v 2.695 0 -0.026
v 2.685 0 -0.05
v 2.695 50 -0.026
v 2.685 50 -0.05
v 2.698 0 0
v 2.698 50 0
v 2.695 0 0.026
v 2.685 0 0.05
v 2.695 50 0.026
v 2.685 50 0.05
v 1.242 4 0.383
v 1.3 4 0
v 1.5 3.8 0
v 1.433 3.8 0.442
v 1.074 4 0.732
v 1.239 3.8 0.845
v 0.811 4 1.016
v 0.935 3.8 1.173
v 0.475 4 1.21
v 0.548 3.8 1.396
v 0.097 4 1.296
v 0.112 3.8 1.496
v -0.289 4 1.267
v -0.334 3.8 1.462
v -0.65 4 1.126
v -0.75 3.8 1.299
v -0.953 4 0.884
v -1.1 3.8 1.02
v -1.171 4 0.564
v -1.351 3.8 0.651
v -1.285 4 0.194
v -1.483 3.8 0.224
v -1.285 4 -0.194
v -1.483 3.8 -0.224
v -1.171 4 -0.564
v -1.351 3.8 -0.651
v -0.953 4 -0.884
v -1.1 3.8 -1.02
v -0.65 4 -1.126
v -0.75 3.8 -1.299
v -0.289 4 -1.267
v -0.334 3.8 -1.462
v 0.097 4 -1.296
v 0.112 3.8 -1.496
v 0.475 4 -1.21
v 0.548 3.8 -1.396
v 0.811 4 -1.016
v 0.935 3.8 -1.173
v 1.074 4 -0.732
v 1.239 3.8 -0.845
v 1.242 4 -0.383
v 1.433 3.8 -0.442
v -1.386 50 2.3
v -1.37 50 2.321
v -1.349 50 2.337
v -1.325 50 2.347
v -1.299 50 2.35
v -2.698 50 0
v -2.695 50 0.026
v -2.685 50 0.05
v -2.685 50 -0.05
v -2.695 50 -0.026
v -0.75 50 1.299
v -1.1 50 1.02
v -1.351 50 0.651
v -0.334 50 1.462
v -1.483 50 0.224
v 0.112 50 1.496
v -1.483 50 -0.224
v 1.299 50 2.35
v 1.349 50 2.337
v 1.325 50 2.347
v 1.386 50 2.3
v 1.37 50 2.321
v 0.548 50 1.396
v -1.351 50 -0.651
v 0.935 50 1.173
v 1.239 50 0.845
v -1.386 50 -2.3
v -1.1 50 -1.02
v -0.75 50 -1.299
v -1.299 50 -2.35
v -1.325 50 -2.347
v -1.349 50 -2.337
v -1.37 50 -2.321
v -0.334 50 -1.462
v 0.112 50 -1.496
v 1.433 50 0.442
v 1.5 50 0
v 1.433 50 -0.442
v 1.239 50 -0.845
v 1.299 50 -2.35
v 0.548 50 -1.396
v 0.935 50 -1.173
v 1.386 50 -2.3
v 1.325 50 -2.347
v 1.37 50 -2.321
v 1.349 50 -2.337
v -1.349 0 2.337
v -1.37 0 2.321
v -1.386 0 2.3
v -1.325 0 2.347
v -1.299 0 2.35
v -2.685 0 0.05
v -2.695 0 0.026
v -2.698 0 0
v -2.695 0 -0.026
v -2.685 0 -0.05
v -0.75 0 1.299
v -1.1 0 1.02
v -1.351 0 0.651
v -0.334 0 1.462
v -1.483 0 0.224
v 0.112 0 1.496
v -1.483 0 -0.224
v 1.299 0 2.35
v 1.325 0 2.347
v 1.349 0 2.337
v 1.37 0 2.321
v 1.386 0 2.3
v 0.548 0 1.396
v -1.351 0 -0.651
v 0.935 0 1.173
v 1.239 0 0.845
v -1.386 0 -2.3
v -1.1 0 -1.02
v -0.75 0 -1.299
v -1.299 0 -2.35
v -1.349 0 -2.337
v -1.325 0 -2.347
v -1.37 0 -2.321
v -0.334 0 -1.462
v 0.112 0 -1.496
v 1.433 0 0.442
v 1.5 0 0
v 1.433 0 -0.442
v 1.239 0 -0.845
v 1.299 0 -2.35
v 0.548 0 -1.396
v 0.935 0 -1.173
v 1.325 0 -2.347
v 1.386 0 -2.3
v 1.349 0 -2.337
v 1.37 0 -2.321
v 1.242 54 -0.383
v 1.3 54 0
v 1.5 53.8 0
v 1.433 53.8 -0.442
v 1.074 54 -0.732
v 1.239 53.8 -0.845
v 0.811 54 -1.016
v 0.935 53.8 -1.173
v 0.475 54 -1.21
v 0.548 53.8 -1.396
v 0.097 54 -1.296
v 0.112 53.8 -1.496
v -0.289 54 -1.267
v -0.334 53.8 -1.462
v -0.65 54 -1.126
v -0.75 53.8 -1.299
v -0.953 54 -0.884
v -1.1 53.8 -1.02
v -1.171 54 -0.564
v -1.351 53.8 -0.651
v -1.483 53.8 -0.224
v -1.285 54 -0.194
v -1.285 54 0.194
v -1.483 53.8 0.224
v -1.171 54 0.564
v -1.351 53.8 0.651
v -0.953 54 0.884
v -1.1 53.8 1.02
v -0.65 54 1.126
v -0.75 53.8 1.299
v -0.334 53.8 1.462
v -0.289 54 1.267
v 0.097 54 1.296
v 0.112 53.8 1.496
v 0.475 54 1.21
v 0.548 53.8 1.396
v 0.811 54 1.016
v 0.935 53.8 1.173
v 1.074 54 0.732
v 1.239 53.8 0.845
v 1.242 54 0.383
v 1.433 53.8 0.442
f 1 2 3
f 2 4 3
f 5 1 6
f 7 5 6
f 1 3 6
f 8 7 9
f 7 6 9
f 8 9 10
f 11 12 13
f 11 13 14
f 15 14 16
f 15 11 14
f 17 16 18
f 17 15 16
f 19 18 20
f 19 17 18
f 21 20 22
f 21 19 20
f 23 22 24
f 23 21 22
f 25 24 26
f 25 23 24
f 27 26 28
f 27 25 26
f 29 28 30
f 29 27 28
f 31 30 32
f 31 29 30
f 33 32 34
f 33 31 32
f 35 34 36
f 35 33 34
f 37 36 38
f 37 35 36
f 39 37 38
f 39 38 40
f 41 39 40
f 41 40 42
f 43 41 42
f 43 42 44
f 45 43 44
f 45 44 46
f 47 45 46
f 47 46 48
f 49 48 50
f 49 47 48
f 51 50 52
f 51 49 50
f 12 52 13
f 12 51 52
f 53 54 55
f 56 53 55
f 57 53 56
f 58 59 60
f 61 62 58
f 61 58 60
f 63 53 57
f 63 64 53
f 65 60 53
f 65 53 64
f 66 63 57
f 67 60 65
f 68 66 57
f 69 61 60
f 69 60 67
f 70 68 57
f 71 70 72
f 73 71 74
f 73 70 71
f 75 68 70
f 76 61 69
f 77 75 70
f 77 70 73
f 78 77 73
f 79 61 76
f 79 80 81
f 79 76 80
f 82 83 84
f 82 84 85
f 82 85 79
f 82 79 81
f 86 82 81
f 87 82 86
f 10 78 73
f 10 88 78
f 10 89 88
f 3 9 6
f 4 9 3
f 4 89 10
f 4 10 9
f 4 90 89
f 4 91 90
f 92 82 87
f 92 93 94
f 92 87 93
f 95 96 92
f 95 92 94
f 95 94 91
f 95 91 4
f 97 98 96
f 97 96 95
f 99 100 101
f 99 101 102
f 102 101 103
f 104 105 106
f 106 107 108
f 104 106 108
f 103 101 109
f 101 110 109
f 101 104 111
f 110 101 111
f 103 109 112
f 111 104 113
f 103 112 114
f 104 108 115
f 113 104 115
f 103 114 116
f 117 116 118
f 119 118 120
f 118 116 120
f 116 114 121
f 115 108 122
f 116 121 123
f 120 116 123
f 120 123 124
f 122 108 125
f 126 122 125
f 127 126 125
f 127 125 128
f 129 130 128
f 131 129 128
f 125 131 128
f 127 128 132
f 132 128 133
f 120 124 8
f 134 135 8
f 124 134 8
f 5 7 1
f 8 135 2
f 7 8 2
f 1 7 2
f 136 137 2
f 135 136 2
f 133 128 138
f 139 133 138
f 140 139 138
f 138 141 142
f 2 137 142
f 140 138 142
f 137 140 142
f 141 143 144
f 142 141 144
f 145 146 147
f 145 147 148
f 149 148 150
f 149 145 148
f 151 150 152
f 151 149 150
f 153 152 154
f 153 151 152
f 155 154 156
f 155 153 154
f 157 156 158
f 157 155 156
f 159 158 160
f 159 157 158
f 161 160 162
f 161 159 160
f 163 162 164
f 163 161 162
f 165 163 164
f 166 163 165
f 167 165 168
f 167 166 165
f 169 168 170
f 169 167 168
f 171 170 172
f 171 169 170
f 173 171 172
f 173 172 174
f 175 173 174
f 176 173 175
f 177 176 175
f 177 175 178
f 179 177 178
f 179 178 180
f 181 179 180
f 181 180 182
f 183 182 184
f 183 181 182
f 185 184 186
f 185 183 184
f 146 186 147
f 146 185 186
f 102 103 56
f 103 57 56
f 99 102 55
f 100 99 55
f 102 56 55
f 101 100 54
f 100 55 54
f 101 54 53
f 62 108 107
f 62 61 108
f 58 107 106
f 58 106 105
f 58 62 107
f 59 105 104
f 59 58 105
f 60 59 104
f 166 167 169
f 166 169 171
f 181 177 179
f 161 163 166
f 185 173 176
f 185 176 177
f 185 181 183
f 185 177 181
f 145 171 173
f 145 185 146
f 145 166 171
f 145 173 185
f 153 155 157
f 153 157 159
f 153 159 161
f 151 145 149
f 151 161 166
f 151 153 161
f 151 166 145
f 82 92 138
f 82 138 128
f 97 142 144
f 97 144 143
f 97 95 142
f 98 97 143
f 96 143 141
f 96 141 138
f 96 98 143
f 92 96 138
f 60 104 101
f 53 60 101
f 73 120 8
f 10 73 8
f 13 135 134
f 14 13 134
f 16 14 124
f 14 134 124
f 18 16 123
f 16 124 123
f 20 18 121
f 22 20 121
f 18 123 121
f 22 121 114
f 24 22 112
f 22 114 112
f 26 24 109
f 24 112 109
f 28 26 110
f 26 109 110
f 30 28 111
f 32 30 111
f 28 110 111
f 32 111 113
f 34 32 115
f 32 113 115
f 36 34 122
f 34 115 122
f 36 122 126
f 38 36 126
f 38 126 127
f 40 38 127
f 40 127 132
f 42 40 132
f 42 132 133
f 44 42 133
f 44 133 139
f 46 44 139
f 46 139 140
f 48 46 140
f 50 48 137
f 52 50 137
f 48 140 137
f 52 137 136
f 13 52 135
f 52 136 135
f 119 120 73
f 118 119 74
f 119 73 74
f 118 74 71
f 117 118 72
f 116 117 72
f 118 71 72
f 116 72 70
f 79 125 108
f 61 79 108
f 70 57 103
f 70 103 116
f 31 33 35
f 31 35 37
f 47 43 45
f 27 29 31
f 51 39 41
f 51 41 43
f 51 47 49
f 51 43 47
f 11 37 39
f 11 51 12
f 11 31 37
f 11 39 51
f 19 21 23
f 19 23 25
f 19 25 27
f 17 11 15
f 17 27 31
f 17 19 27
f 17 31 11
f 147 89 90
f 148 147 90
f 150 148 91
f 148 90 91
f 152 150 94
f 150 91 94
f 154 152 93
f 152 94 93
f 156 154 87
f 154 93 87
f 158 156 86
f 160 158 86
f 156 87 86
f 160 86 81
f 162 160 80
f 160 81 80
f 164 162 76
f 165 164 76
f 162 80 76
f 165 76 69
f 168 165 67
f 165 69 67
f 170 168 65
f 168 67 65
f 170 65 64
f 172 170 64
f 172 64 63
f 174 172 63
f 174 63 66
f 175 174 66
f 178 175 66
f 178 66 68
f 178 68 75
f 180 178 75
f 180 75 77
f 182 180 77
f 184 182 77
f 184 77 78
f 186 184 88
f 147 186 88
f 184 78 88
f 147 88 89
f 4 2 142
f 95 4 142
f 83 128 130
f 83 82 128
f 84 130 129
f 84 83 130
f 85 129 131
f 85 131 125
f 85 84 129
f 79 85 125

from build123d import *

# Parameters (mm, degrees)
EXTRUDE_1_DEPTH     = 50
SKETCH_2_R          = 1.5
EXTRUDE_2_DEPTH     = 4
SKETCH_3_R          = 1.5
CUT_EXTRUDE_1_DEPTH = 4
CHAMFER_1_SIZE      = 0.2
FILLET_1_R          = 0.1


with BuildPart() as part:
    # 草图1 → 凸台-拉伸1 (new body)
    with BuildSketch(Plane(origin=(0, 0, 0), x_dir=(1, 0, 0), z_dir=(0, 1, 0))):
        Polygon((2.713546265, 0), (1.356773133, 2.35), (-1.356773133, 2.35), (-2.713546265, 0), (-1.356773133, -2.35), (1.356773133, -2.35), align=None)
    extrude(amount=EXTRUDE_1_DEPTH)

    # 草图2 → 凸台-拉伸2 (add)
    with BuildSketch(Plane(origin=(0, 50, 0), x_dir=(1, 0, 0), z_dir=(0, 1, 0))):
        Circle(SKETCH_2_R)
    extrude(amount=EXTRUDE_2_DEPTH)

    # 草图3 → 切除-拉伸1 (cut)
    with BuildSketch(Plane.XZ):
        Circle(SKETCH_3_R)
    extrude(amount=-CUT_EXTRUDE_1_DEPTH, mode=Mode.SUBTRACT)

    # 倒角1
    chamfer_1_edges = [part.edges().sort_by_distance(p)[0] for p in [
        (-1.5, 4, 0),
        (-1.5, 54, 0),
    ]]
    chamfer(chamfer_1_edges, length=CHAMFER_1_SIZE)

    # 圆角1
    fillet_1_edges = [part.edges().sort_by_distance(p)[0] for p in [
        (2.713546265, 25, 0),
        (1.356773133, 25, -2.35),
        (1.356773133, 25, 2.35),
        (-1.356773133, 25, -2.35),
        (-1.356773133, 25, 2.35),
        (-2.713546265, 25, 0),
    ]]
    fillet(fillet_1_edges, radius=FILLET_1_R)


solid = part.part
